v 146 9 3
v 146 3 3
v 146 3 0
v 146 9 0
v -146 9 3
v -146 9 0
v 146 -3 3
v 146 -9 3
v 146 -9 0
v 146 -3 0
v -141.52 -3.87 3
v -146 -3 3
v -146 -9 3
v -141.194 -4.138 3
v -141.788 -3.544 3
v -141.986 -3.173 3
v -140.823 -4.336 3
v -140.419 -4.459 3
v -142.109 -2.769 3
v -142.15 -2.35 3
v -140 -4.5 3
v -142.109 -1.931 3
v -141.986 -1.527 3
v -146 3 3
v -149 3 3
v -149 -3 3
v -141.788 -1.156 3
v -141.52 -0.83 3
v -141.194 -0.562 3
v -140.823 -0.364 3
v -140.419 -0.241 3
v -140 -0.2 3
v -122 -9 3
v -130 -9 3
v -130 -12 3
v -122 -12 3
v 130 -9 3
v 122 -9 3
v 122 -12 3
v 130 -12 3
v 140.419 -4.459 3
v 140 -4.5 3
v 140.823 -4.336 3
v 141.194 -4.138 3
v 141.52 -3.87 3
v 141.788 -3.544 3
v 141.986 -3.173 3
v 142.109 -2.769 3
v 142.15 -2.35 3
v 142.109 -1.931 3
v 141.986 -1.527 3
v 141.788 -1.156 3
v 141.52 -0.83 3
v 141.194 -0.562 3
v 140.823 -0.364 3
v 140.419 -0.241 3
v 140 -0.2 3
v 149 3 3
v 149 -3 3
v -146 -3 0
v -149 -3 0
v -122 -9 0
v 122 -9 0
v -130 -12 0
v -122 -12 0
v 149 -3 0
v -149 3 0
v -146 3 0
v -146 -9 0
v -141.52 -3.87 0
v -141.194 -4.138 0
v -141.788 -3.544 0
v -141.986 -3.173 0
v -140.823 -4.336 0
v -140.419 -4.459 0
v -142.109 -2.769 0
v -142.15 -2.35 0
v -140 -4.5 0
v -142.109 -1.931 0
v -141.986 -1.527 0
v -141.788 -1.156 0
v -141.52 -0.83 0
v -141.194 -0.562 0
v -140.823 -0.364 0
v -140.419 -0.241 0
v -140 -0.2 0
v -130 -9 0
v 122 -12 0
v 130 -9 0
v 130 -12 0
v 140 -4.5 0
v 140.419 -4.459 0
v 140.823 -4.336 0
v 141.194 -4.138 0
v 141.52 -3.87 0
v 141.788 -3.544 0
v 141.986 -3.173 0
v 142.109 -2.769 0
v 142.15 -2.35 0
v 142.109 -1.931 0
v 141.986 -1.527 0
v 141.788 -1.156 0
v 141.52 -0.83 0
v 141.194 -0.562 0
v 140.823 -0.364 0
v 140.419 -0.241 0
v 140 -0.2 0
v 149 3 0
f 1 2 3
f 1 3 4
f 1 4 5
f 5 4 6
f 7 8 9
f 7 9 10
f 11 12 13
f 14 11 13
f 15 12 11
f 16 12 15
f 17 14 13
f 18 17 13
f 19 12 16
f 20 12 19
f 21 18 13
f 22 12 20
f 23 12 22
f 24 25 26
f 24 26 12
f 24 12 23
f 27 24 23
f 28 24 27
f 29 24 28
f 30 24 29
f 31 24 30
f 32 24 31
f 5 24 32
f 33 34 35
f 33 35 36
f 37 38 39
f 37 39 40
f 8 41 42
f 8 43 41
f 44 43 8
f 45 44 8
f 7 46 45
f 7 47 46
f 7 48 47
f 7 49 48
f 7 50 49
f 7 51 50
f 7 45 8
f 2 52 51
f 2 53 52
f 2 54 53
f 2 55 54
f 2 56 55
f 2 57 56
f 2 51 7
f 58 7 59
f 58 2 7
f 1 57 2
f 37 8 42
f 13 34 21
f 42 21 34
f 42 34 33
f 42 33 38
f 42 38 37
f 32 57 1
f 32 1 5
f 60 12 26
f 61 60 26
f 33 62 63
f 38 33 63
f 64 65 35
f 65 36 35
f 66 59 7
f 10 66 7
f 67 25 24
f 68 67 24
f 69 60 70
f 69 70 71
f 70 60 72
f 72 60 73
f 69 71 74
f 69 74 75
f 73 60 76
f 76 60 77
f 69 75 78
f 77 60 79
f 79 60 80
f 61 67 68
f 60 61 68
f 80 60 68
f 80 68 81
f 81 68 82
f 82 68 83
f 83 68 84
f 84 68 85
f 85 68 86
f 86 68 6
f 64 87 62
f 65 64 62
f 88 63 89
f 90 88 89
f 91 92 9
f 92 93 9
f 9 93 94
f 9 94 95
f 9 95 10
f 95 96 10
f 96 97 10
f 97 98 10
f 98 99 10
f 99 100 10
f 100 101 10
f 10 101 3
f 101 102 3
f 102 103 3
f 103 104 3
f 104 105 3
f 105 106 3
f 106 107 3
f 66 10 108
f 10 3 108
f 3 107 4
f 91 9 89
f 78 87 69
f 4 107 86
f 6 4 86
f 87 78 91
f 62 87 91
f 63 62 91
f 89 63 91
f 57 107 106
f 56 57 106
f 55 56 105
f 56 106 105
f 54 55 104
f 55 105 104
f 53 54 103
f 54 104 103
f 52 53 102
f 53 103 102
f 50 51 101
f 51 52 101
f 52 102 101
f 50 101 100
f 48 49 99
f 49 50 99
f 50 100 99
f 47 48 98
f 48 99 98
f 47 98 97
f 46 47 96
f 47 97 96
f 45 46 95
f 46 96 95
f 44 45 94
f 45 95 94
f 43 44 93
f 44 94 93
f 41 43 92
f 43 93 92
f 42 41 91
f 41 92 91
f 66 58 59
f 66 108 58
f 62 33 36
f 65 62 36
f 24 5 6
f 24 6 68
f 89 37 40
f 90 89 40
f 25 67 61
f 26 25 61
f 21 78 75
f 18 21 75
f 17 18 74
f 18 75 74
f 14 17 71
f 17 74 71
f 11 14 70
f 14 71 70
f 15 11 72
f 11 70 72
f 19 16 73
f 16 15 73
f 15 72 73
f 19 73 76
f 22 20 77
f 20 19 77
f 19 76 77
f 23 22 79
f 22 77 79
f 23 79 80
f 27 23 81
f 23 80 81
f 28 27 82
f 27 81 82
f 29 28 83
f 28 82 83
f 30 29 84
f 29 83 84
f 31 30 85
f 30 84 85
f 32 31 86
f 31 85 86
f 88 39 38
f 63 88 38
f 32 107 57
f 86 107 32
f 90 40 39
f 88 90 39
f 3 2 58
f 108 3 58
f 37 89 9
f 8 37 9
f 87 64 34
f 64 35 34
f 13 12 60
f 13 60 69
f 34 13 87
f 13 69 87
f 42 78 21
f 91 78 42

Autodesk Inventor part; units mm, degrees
ref_plane "YZ Plane" through (0, 0, 0) normal (1, 0, 0) x (0, 1, 0)
ref_plane "XZ Plane" through (0, 0, 0) normal (0, 1, 0) x (-1, 0, 0)
ref_plane "XY Plane" through (0, 0, 0) normal (0, 0, 1) x (1, 0, 0)
sketch "草圖1" plane through (0, 0, 0) normal (0, 0, 1) x (1, 0, 0)
  line L0 (-140, 0) -> (140, 0) construction
  line L1 (-140, 0) -> (140, 0) construction
  line L2 (-140, -9) -> (140, -9)
  line L3 (140, 9) -> (-140, 9)
  arc A0 (-140, 9) -> (-140, -9) centre (-140, 0) ccw
  arc A1 (140, -9) -> (140, 9) centre (140, 0) ccw
  line L4 (-140, -2.35) -> (140, -2.35) construction
  line L5 (-140, -4.5) -> (140, -4.5)
  line L6 (140, -0.2) -> (-140, -0.2)
  arc A2 (-140, -0.2) -> (-140, -4.5) centre (-140, -2.35) ccw
  arc A3 (140, -4.5) -> (140, -0.2) centre (140, -2.35) ccw
  line L7 (140, -2.35) -> (140, 0) construction
  line L8 (-140, 9) -> (-149, 9)
  line L9 (-149, 9) -> (-149, -9)
  line L10 (-149, -9) -> (-140, -9)
  line L11 (-140, -9) -> (-140, 9)
  line L12 (140, 9) -> (149, 9)
  line L13 (149, 9) -> (149, -9)
  line L14 (149, -9) -> (140, -9)
  line L15 (140, -9) -> (140, 9)
  point P0 (0, 0)
  point P1 (0, 0)
  point P2 (0, 0)
  point P3 (0, -2.35)
  point P4 (149, 0)
  point P5 (-140, -9)
  point P6 (-149, 0)
  dimension "d5" = 9
  dimension "d7" = 280
  dimension "d22" = 2.15
  dimension "d24" = 4.5
extrude "擠出1" add sketch "草圖1" along normal blind 3 contours L11 L5 L15 L2 | L10 L9 A0 | A0 L11 A2 | L15 A3 A1 | A1 L13 L14 | L9 L8 A0 | A1 L12 L13 | L3 L15 L6 L11
sketch "草圖2" plane through (0, 0, 3) normal (0, 0, 1) x (1, 0, 0)
  line L0 (-208.6, 0) -> (208.6, 0) projected
  line L1 (-130, -9) -> (-122, -9)
  line L2 (-122, -9) -> (-122, -12)
  line L3 (-122, -12) -> (-130, -12)
  line L4 (-130, -12) -> (-130, -9)
  line L5 (122, -9) -> (130, -9)
  line L6 (130, -9) -> (130, -12)
  line L7 (130, -12) -> (122, -12)
  line L8 (122, -12) -> (122, -9)
  arc A0 (-140, -0.2) -> (-140, -4.5) centre (-140, -2.35) ccw projected
  arc A1 (140, -4.5) -> (140, -0.2) centre (140, -2.35) ccw projected
  line L9 (-149, -9) -> (149, -9) projected
  point P0 (0, 0)
  point P1 (130, -10.5)
  point P2 (-130, -10.5)
  dimension "d17" = 8
  dimension "d18" = 3
  dimension "d19" = 3
  dimension "d20" = 8
  dimension "d25" = 10
  dimension "d26" = 10
extrude "擠出2" add sketch "草圖2" against normal up to surface (3 mm away)
ref_plane "工作平面2" through (-140, -2.35, 0) normal (0, 1, 0) x (1, 0, 0)
sketch "草圖4" plane through (0, 0, 3) normal (0, 0, 1) x (1, 0, 0)
  line L0 (149, 9) -> (-149, 9) projected
  line L1 (-149, -9) -> (-130, -9) projected
  line L2 (-149, 9) -> (-146, 9)
  line L3 (-146, 9) -> (-146, -9)
  line L4 (-146, -9) -> (-149, -9)
  line L5 (-149, -9) -> (-149, 9)
  line L6 (-149, 9) -> (-149, -9) projected
  line L7 (-149, 3) -> (-146, 3)
  line L8 (-146, 3) -> (-146, -3)
  line L9 (-146, -3) -> (-149, -3)
  line L10 (-149, -3) -> (-149, 3)
  line L11 (149, -9) -> (149, 9) projected
  line L12 (149, -9) -> (146, -9)
  line L13 (146, -9) -> (146, 9)
  line L14 (146, 9) -> (149, 9)
  line L15 (149, 9) -> (149, -9)
  line L16 (149, -3) -> (146, -3)
  line L17 (146, -3) -> (146, 3)
  line L18 (146, 3) -> (149, 3)
  line L19 (149, 3) -> (149, -3)
  point P0 (0, 0)
  dimension "d27" = 6
  dimension "d28" = 6
  dimension "d29" = 3
  dimension "d32" = 3
extrude "擠出3" cut sketch "草圖4" against normal up to surface (3 mm away) contours L11 L18 L13 L0 | L3 L7 L5 L0 | L11 L12 L13 L16 | L3 L1 L5 L9
sketch "草圖5" plane through (0, 0, 3) normal (0, 0, 1) x (1, 0, 0)
  arc A0 (-140, -0.2) -> (-140, -4.5) centre (-140, -2.35) ccw projected
  line L0 (-140, -0.2) -> (140, -0.2) projected
  arc A1 (140, -4.5) -> (140, -0.2) centre (140, -2.35) ccw projected
  line L1 (140, -4.5) -> (-140, -4.5) projected
  line L2 (-146, 9) -> (-146, 3) projected
  line L3 (-146, 3) -> (-149, 3) projected
  line L4 (-149, 3) -> (-149, -3) projected
  line L5 (-149, -3) -> (-146, -3) projected
  line L6 (-146, -3) -> (-146, -9) projected
  line L7 (-146, -9) -> (-130, -9) projected
  line L8 (-130, -9) -> (-130, -12) projected
  line L9 (-130, -12) -> (-122, -12) projected
  line L10 (-122, -12) -> (-122, -9) projected
  line L11 (-122, -9) -> (122, -9) projected
  line L12 (122, -9) -> (122, -12) projected
  line L13 (122, -12) -> (130, -12) projected
  line L14 (130, -12) -> (130, -9) projected
  line L15 (130, -9) -> (146, -9) projected
  line L16 (146, -9) -> (146, -3) projected
  line L17 (146, -3) -> (149, -3) projected
  line L18 (149, -3) -> (149, 3) projected
  line L19 (149, 3) -> (146, 3) projected
  line L20 (146, 3) -> (146, 9) projected
  line L21 (146, 9) -> (-146, 9) projected
  point P0 (0, 0)
equation "\"d32\" = d29"
